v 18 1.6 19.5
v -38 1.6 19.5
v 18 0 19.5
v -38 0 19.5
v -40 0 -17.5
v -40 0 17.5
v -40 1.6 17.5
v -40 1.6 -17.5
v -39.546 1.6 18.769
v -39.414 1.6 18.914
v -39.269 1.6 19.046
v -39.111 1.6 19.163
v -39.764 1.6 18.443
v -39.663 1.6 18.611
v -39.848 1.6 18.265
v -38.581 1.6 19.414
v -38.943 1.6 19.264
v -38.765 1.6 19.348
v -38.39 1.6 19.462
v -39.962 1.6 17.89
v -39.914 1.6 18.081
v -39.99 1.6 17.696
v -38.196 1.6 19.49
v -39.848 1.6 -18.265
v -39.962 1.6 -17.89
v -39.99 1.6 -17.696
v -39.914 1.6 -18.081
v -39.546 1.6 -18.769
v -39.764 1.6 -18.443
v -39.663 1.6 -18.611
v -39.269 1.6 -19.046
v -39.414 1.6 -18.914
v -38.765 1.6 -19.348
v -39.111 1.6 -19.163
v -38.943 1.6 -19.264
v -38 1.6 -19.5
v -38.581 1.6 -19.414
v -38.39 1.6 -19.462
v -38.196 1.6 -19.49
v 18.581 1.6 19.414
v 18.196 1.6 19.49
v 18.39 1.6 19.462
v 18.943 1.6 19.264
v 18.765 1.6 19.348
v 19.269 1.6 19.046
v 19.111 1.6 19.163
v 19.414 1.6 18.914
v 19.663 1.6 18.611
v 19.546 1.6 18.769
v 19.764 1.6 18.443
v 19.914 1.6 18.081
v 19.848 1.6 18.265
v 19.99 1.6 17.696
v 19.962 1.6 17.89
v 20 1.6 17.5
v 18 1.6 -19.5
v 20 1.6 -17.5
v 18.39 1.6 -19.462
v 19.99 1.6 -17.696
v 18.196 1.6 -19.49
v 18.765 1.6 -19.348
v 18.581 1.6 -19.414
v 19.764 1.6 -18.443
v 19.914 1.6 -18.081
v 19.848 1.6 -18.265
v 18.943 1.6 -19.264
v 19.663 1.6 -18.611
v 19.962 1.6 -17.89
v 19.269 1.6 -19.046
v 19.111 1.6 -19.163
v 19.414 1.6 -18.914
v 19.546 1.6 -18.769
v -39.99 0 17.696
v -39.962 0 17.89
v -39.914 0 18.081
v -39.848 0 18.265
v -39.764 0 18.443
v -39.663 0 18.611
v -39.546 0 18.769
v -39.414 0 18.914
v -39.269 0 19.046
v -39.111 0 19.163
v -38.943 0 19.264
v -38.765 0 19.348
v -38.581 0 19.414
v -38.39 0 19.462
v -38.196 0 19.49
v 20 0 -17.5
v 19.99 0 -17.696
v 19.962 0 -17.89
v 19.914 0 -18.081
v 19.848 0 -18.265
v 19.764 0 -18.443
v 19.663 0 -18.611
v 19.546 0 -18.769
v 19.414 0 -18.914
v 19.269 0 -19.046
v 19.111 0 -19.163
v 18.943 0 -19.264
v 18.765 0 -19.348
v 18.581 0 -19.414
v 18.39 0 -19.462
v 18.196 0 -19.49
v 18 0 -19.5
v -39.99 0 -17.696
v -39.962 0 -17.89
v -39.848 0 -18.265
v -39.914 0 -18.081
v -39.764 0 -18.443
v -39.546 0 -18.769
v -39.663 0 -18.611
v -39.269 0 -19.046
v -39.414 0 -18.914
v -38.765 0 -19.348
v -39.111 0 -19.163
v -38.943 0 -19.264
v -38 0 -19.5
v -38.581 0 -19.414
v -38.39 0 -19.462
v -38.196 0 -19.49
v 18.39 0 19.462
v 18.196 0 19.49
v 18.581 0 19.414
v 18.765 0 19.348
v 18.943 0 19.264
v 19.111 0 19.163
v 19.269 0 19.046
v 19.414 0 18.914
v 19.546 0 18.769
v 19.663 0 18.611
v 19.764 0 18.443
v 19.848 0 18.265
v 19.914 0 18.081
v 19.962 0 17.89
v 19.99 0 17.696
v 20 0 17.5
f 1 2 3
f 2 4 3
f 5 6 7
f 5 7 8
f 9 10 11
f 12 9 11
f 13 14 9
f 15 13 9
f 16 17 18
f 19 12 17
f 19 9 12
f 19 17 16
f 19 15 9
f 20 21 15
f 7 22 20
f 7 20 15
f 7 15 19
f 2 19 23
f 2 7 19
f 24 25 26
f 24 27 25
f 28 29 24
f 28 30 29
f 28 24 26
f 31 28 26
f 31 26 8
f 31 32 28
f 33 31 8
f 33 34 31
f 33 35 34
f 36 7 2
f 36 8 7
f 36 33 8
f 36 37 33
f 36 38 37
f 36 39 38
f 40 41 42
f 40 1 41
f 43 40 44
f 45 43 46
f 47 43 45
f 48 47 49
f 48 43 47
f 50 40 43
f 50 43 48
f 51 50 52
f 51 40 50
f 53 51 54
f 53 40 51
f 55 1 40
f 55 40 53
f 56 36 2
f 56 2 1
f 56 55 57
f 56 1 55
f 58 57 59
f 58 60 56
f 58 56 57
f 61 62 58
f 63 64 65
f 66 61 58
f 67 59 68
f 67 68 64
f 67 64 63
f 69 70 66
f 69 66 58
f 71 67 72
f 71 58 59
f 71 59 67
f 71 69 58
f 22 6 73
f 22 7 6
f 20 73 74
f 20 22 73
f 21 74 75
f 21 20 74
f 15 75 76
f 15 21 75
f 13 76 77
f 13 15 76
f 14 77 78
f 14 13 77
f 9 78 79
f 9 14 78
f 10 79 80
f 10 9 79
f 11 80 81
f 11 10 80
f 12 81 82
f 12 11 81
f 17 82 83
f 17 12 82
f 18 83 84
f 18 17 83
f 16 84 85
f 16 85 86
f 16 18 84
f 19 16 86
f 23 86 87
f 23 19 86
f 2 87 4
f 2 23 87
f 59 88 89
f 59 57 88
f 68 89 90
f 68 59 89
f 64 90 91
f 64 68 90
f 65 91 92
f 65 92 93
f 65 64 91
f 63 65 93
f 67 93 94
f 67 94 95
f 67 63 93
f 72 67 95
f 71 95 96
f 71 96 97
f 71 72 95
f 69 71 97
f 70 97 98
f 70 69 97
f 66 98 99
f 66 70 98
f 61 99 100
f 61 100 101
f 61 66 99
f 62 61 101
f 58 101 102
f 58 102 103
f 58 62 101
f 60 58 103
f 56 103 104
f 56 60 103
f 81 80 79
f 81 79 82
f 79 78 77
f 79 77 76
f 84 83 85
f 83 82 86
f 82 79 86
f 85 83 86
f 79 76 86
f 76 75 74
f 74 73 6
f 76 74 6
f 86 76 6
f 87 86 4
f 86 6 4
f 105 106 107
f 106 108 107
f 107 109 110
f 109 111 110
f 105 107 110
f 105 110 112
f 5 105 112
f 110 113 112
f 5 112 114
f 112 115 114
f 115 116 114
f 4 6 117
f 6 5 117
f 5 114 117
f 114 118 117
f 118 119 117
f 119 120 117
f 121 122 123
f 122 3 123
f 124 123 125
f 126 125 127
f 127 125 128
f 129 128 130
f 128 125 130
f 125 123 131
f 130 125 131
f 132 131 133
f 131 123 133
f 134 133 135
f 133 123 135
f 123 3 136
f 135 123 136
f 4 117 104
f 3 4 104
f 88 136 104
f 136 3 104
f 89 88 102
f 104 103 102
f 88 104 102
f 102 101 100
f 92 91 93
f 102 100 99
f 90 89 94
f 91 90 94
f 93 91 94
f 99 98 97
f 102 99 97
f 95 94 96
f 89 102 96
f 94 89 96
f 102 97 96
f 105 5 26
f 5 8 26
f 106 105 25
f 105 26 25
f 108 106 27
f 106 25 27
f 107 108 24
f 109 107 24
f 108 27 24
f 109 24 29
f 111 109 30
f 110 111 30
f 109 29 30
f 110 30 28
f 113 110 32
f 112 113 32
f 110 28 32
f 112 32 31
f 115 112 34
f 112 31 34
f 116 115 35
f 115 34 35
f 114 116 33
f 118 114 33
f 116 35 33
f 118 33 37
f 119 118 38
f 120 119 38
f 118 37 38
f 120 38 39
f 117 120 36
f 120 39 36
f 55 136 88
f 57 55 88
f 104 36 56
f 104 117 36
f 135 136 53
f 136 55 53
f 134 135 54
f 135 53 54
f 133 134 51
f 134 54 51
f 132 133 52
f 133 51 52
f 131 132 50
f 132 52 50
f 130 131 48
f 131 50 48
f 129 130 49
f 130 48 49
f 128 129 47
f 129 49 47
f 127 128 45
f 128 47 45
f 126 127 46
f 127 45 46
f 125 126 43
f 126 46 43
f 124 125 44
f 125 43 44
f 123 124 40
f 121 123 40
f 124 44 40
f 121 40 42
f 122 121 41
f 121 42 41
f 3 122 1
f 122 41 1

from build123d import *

# Parameters (mm, degrees)
SKETCH1_W           = 40
SKETCH1_H           = 39
BOSS_EXTRUDE1_DEPTH = 1.6
SKETCH2_W           = 20
SKETCH2_H           = 39
BOSS_EXTRUDE2_DEPTH = 1.6
FILLET1_R           = 2


with BuildPart() as part:
    # Sketch1 → Boss-Extrude1 (new body)
    with BuildSketch(Plane(origin=(0, 0, 0), x_dir=(1, 0, 0), z_dir=(0, 1, 0))):
        Rectangle(SKETCH1_W, SKETCH1_H)
    extrude(amount=BOSS_EXTRUDE1_DEPTH)

    # Sketch2 → Boss-Extrude2 (add)
    with BuildSketch(Plane(origin=(0, 0, 0), x_dir=(1, 0, 0), z_dir=(0, 1, 0))):
        with Locations((-30, 0)):
            Rectangle(SKETCH2_W, SKETCH2_H)
    extrude(amount=BOSS_EXTRUDE2_DEPTH)

    # Fillet1
    fillet1_edges = [part.edges().sort_by_distance(p)[0] for p in [
        (-40, 0.8, -19.5),
        (-40, 0.8, 19.5),
        (20, 0.8, -19.5),
        (20, 0.8, 19.5),
    ]]
    fillet(fillet1_edges, radius=FILLET1_R)


solid = part.part
